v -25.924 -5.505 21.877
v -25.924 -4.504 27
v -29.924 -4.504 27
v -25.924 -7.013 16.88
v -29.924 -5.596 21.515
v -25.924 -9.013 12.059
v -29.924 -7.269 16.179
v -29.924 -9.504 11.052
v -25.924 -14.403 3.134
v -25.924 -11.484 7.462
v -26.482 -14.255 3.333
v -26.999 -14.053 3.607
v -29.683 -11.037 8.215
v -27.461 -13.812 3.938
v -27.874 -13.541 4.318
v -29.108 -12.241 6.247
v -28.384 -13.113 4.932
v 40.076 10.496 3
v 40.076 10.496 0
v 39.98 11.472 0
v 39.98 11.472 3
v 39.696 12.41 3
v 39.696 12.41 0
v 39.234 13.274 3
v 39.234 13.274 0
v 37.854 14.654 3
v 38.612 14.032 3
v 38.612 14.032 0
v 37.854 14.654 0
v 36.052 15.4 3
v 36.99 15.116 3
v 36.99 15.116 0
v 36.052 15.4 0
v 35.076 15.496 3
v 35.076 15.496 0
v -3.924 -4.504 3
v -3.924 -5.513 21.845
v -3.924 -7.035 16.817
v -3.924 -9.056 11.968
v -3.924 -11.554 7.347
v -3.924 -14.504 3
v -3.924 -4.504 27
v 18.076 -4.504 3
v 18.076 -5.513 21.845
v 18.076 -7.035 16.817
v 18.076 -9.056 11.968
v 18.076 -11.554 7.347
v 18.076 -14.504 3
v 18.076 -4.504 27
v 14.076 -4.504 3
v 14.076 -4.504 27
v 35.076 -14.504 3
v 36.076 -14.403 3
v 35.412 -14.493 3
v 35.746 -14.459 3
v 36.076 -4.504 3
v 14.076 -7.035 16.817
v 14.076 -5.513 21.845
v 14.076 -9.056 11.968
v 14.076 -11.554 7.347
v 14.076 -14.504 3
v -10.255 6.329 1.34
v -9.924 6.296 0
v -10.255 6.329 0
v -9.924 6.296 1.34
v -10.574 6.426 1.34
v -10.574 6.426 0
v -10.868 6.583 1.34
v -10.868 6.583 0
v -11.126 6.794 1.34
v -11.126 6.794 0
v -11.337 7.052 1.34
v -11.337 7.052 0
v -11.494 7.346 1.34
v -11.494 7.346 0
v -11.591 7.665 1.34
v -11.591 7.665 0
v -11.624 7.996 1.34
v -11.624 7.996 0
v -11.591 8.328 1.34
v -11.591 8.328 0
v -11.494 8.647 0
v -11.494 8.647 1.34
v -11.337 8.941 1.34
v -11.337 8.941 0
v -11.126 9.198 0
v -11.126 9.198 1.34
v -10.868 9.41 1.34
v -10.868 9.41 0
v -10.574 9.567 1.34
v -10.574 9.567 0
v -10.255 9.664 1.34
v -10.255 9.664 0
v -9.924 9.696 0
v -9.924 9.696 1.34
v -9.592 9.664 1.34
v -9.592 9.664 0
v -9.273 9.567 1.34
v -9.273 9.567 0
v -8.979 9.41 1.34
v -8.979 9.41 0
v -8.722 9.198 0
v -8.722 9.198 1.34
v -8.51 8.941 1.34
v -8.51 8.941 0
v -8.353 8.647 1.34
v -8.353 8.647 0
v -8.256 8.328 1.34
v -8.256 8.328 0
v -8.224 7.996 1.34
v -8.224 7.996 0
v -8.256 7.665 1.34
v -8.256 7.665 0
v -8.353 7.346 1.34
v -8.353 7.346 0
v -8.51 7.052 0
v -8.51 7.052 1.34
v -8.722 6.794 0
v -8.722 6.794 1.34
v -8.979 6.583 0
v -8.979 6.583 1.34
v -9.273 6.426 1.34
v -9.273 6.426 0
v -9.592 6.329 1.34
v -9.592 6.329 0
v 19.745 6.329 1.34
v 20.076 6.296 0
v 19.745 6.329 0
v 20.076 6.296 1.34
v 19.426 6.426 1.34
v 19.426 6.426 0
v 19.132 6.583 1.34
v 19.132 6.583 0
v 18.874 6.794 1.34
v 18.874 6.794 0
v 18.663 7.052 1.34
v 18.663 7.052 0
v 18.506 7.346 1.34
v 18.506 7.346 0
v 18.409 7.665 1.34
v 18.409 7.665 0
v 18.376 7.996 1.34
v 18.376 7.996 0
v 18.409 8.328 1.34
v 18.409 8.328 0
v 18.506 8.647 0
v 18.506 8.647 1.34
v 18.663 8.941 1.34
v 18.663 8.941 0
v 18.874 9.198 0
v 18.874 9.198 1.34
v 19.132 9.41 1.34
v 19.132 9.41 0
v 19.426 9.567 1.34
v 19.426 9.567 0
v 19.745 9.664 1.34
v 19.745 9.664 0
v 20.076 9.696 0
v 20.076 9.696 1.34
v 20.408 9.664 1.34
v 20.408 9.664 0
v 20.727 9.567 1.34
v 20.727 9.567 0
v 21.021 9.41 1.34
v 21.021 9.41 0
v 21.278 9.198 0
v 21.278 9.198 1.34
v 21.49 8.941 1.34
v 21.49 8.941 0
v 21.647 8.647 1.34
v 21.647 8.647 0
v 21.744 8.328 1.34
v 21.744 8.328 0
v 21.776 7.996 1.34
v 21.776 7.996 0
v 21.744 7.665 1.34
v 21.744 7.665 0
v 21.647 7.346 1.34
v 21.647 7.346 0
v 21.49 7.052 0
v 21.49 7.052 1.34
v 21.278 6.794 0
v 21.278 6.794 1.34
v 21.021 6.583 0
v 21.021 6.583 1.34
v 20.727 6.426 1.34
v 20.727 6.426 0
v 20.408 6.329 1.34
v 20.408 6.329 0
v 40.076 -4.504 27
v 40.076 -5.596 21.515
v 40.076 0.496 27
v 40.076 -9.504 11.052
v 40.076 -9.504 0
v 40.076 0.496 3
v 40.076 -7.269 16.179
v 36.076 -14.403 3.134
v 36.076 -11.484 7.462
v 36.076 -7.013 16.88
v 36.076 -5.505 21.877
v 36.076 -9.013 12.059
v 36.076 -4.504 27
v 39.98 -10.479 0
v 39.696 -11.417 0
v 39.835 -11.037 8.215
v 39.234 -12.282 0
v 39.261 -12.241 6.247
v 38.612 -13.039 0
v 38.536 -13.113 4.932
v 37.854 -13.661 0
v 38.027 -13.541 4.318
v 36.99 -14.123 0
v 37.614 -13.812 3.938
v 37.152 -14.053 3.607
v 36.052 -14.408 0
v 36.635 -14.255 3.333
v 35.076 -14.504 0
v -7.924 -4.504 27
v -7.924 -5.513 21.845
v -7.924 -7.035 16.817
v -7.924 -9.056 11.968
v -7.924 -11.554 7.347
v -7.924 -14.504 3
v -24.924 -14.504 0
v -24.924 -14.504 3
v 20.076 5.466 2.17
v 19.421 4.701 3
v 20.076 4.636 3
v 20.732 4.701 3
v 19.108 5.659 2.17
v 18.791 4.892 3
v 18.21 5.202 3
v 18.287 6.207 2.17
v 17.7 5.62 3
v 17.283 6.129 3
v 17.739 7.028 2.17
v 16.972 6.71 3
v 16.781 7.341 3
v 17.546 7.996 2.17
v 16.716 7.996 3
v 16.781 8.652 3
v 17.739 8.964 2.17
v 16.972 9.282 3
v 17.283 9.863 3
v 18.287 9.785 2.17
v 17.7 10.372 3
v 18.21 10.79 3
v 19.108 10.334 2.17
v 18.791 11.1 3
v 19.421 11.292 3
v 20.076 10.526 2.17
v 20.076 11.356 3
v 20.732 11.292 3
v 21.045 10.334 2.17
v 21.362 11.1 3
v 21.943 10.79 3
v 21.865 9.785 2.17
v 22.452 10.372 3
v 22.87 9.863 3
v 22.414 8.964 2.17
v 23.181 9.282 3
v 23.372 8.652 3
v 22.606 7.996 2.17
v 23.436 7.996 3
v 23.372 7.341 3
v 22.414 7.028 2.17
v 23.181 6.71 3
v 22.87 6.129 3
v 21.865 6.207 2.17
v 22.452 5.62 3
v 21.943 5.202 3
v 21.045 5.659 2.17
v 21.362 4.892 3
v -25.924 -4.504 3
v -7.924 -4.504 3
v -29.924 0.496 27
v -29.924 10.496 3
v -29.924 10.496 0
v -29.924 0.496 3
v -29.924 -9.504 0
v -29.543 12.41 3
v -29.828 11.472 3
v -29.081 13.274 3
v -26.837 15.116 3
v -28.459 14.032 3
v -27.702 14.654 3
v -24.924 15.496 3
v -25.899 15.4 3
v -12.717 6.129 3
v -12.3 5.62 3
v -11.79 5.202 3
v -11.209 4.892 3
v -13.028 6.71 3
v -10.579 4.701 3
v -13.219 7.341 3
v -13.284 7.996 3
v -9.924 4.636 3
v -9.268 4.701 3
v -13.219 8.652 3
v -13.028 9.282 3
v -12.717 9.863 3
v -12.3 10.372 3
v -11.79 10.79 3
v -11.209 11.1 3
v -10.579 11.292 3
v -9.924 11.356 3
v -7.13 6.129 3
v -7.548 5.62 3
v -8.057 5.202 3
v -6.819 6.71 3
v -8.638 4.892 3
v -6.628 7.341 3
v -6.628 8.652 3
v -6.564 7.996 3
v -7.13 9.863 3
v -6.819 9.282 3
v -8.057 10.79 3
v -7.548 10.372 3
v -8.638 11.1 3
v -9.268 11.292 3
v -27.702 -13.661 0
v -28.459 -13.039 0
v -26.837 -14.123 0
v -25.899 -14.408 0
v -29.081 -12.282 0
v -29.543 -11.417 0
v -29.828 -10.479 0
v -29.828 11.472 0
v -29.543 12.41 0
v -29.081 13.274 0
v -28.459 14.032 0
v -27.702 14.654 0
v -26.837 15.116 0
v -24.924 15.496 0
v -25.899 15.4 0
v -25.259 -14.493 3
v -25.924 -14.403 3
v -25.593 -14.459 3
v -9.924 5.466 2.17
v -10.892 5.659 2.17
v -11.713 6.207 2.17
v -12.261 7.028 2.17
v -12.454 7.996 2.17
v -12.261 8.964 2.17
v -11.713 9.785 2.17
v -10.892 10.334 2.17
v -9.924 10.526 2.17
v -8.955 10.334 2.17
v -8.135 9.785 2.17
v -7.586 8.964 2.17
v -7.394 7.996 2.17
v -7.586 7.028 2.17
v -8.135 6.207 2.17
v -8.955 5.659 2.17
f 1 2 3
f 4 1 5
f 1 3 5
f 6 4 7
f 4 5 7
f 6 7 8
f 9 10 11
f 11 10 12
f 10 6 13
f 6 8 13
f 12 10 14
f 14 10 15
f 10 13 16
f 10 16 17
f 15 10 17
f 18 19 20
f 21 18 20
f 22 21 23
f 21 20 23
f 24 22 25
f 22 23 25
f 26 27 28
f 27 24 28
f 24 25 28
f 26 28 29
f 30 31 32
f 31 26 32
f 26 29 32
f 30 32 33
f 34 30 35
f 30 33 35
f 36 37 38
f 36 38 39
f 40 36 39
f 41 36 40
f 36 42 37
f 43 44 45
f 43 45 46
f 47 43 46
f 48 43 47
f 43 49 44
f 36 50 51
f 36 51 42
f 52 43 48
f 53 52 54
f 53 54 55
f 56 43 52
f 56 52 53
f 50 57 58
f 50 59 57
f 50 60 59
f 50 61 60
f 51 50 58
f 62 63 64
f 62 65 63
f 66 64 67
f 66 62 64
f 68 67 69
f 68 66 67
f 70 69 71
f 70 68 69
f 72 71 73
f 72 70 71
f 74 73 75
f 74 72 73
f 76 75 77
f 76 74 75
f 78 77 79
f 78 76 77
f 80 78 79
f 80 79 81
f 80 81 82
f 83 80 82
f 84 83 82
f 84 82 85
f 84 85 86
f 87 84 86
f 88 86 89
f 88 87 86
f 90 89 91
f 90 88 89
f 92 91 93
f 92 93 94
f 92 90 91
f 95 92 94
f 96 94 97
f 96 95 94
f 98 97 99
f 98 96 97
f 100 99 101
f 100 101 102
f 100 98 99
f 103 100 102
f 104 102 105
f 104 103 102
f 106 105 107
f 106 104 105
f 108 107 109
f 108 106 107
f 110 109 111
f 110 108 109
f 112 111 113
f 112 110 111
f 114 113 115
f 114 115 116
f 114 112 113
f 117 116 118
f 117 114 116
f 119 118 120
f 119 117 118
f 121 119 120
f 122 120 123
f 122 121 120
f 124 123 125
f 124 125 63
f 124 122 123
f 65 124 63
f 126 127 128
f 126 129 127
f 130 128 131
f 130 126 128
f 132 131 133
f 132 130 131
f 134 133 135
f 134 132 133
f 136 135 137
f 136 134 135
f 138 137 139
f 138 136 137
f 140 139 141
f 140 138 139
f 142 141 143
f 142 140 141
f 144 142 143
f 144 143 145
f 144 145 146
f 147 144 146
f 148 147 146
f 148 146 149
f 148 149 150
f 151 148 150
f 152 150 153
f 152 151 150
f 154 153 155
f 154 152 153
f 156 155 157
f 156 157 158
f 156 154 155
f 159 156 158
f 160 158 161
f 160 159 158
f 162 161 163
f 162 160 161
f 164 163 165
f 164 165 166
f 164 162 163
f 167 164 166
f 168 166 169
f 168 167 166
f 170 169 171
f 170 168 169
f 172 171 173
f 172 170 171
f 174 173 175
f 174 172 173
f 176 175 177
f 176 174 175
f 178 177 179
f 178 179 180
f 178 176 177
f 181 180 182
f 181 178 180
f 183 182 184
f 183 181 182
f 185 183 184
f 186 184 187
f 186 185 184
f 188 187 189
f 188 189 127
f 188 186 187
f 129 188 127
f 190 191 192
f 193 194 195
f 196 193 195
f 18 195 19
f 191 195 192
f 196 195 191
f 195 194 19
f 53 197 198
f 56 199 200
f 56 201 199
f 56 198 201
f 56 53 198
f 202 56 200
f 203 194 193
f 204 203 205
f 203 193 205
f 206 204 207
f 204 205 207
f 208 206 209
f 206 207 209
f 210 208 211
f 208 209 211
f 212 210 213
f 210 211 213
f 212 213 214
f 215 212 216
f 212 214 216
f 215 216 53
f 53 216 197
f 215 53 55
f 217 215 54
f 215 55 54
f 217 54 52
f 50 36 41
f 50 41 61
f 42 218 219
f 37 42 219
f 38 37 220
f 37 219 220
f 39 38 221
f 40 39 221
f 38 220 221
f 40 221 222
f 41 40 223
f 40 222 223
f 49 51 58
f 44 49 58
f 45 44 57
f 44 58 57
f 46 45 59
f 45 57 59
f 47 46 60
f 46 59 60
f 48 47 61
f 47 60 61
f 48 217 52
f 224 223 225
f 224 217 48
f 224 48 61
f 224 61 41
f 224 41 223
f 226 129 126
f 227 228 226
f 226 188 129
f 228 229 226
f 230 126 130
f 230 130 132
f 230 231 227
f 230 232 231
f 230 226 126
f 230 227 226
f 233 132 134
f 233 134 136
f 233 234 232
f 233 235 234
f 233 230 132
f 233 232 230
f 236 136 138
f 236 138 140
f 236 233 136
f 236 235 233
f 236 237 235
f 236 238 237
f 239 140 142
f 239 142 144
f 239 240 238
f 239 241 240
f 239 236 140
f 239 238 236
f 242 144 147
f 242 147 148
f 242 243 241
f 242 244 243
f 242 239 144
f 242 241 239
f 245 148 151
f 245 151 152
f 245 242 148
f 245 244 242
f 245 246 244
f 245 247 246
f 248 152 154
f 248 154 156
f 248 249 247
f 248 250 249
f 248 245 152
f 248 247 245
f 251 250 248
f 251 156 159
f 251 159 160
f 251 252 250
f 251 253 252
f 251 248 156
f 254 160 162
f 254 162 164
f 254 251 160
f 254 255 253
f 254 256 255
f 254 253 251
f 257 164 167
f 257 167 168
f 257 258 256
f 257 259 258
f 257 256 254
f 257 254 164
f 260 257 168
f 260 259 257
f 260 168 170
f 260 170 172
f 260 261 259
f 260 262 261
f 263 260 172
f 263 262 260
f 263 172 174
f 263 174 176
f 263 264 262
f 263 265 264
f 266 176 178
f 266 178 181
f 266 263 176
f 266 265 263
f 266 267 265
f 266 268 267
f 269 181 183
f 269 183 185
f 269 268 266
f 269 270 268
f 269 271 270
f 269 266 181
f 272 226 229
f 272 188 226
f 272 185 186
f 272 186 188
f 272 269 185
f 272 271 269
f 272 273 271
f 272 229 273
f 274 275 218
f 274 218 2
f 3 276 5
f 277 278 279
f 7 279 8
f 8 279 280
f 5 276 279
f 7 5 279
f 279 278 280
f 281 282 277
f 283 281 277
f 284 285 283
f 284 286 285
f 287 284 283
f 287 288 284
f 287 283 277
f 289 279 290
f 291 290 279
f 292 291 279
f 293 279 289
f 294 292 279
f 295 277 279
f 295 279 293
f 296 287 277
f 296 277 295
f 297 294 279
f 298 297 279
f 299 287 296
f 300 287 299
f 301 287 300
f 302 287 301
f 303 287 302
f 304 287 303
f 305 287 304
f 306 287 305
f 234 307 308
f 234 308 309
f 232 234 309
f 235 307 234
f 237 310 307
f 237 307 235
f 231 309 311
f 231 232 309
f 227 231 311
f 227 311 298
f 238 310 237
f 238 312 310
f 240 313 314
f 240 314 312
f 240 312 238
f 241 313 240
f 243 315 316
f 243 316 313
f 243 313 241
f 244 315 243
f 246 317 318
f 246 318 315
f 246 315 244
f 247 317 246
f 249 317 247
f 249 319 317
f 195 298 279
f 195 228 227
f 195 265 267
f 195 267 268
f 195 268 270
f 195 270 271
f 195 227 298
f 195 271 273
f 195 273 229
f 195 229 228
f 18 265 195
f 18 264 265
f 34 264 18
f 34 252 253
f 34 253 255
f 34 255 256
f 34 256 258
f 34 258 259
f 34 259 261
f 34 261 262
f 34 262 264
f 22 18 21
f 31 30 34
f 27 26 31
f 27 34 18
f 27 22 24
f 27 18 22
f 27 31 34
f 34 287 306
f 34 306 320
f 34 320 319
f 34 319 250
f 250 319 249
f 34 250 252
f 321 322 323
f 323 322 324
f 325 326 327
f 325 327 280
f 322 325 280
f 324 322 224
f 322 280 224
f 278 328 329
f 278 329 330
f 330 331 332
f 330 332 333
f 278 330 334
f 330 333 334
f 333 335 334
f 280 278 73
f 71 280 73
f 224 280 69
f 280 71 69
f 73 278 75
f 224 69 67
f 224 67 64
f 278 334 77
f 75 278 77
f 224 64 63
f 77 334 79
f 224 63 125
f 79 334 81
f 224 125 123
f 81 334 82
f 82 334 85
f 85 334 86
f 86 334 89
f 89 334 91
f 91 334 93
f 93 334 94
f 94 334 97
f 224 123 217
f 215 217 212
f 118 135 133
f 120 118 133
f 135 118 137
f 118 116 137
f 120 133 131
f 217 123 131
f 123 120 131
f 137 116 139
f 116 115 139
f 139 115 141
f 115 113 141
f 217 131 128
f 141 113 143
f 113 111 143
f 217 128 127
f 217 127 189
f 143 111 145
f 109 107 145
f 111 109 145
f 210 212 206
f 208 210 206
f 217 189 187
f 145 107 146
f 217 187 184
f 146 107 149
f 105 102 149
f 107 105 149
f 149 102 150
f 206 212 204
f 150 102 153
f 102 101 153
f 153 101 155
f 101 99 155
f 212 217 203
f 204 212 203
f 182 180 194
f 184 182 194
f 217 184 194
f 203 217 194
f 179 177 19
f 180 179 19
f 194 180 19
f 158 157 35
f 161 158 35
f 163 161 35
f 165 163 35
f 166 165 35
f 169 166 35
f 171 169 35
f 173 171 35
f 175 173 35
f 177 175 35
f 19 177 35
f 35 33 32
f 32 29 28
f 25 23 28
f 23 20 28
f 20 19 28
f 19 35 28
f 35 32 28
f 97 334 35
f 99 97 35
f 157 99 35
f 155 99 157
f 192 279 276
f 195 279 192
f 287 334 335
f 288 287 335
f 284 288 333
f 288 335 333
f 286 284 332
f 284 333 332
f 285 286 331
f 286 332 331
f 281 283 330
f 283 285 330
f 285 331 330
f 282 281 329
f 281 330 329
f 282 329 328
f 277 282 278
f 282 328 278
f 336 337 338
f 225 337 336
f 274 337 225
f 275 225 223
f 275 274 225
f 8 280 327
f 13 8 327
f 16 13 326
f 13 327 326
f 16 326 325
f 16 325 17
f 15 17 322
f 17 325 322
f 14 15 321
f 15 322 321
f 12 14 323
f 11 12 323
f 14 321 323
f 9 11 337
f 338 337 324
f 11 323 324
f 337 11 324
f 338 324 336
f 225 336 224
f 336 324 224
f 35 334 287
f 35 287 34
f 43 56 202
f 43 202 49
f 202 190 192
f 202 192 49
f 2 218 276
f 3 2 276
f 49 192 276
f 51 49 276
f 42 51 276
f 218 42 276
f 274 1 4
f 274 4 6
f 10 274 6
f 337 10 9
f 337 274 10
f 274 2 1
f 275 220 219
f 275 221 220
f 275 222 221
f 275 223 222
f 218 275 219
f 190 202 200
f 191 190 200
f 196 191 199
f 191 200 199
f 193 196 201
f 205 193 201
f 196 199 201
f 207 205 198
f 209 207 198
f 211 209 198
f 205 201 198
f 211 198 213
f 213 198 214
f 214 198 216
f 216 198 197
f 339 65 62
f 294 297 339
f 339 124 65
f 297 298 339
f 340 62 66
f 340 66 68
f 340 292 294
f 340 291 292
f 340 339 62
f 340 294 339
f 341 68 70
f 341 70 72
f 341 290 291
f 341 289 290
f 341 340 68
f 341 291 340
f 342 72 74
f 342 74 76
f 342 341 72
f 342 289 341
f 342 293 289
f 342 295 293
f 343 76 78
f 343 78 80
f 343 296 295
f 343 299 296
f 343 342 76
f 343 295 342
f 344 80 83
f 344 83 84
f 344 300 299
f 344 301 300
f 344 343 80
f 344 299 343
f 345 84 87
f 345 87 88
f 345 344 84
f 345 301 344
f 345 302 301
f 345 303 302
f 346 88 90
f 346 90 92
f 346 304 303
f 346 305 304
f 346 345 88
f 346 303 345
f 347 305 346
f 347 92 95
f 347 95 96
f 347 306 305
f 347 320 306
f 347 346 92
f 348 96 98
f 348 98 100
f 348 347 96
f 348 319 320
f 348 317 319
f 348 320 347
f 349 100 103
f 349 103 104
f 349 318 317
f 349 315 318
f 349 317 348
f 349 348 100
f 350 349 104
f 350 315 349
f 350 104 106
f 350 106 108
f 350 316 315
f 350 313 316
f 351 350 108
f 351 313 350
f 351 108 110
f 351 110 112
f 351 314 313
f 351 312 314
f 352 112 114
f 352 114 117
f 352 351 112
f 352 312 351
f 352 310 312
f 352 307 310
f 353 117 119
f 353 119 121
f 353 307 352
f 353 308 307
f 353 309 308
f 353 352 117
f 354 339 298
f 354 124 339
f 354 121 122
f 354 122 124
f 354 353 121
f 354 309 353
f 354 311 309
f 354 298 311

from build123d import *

# Parameters (mm, degrees)
CROQUIS1_W                                   = 70
CROQUIS1_H                                   = 30
SALIENTE_EXTRUIR1_DEPTH                      = 3
SALIENTE_EXTRUIR2_DEPTH                      = 24
CORTAR_EXTRUIR1_DEPTH                        = 70.000004
CROQUIS5_R                                   = 1.5
CORTAR_EXTRUIR2_DEPTH                        = 3
REFRENTADO_PARA_TORNILLO_TAP_N_CON_C_2_COUNT = 2
REFRENTADO_PARA_TORNILLO_TAP_N_CON_C_2_PITCH = 30
REDONDEO1_R                                  = 5


with BuildPart() as part:
    # Croquis1 → Saliente-Extruir1 (new body)
    with BuildSketch(Plane.XY):
        with Locations((5.076335878, 0.496183206)):
            Rectangle(CROQUIS1_W, CROQUIS1_H)
    extrude(amount=SALIENTE_EXTRUIR1_DEPTH)

    # Croquis3 → Saliente-Extruir2 (add)
    with BuildSketch(Plane.XY.offset(3)):
        Polygon((-29.923664122, 0.496183206), (40.076335878, 0.496183206), (40.076335878, -4.503816794), (40.076335878, -14.503816794), (36.076335878, -14.503816794), (36.076335878, -4.503816794), (18.076335878, -4.503816794), (18.076335878, -14.503816794), (14.076335878, -14.503816794), (14.076335878, -4.503816794), (-3.923664122, -4.503816794), (-3.923664122, -14.503816794), (-7.923664122, -14.503816794), (-7.923664122, -4.503816794), (-25.923664122, -4.503816794), (-25.923664122, -14.503816794), (-29.923664122, -14.503816794), (-29.923664122, -4.503816794), align=None)
    extrude(amount=SALIENTE_EXTRUIR2_DEPTH)

    # Croquis4 → Cortar-Extruir1 (cut)
    with BuildSketch(Plane.ZY.offset(29.923664122)):
        with BuildLine():
            Line((27, -14.503816794), (27, -4.503816794))
            ThreePointArc((27, -4.503816794), (14.366976751, -7.984560996), (3, -14.503816794))
            Line((3, -14.503816794), (27, -14.503816794))
        make_face()
    extrude(amount=-CORTAR_EXTRUIR1_DEPTH, mode=Mode.SUBTRACT)

    # Croquis5 → Cortar-Extruir2 (cut)
    with BuildSketch(Plane.XY.offset(3)):
        with Locations((-9.923664122, 7.996183206)):
            Circle(CROQUIS5_R)
        with Locations(Location((20.076335878, 7.996183206, 0), (0, 0, 180))):
            Circle(CROQUIS5_R)
    extrude(amount=-CORTAR_EXTRUIR2_DEPTH, mode=Mode.SUBTRACT)

    # Croquis7 → Refrentado para tornillo tapón con cabeza plana de clavija de M31 (revolve, cut)
    with BuildSketch(Plane(origin=(-9.923664122, 7.996183206, 3), x_dir=(0, -1, 0), z_dir=(1, 0, 0))):
        Polygon((0, 0), (0, 3), (1.7, 3), (1.7, 1.66), (3.36, 0), align=None)
    refrentado_para_tornillo_tap_n_con_cabez = revolve(axis=Axis((-9.923664122, 7.996183206, 9.35), (0, 0, -1)), mode=Mode.SUBTRACT)

    # Refrentado para tornillo tap_n con c 2: Refrentado para tornillo tapón con cabeza plana de clavija de M31 ×2
    with Locations(*[(i * REFRENTADO_PARA_TORNILLO_TAP_N_CON_C_2_PITCH, 0, 0) for i in range(1, REFRENTADO_PARA_TORNILLO_TAP_N_CON_C_2_COUNT)]):
        add(refrentado_para_tornillo_tap_n_con_cabez, mode=Mode.SUBTRACT)

    # Redondeo1
    # the kernel refuses this fillet: 5 mm, written as the material it takes off along each edge
    with BuildSketch(Plane(origin=(40.076335878, -14.503816794, 15.5), x_dir=(0, 1, 0), z_dir=(0, 0, -1)), Plane(origin=(-29.923664122, -14.503816794, -12.5), x_dir=(0, 1, 0), z_dir=(0, 0, 1)), Plane(origin=(-29.923664122, 15.496183206, -12.5), x_dir=(1, 0, 0), z_dir=(0, 0, 1))) as redondeo1_piece_1:
        with BuildLine():
            CenterArc((REDONDEO1_R, -REDONDEO1_R), REDONDEO1_R, 90, 90)
            Line((0, -REDONDEO1_R), (0, 0))
            Line((0, 0), (REDONDEO1_R, 0))
        make_face()
    extrude(amount=28, mode=Mode.SUBTRACT)
    with BuildSketch(Plane(origin=(40.076335878, 15.496183206, -12.5), x_dir=(-1, 0, 0), z_dir=(0, 0, 1))) as redondeo1_piece_2:
        with BuildLine():
            CenterArc((REDONDEO1_R, REDONDEO1_R), REDONDEO1_R, 180, 90)
            Line((0, REDONDEO1_R), (0, 0))
            Line((0, 0), (REDONDEO1_R, 0))
        make_face()
    extrude(amount=28, mode=Mode.SUBTRACT)


solid = part.part
